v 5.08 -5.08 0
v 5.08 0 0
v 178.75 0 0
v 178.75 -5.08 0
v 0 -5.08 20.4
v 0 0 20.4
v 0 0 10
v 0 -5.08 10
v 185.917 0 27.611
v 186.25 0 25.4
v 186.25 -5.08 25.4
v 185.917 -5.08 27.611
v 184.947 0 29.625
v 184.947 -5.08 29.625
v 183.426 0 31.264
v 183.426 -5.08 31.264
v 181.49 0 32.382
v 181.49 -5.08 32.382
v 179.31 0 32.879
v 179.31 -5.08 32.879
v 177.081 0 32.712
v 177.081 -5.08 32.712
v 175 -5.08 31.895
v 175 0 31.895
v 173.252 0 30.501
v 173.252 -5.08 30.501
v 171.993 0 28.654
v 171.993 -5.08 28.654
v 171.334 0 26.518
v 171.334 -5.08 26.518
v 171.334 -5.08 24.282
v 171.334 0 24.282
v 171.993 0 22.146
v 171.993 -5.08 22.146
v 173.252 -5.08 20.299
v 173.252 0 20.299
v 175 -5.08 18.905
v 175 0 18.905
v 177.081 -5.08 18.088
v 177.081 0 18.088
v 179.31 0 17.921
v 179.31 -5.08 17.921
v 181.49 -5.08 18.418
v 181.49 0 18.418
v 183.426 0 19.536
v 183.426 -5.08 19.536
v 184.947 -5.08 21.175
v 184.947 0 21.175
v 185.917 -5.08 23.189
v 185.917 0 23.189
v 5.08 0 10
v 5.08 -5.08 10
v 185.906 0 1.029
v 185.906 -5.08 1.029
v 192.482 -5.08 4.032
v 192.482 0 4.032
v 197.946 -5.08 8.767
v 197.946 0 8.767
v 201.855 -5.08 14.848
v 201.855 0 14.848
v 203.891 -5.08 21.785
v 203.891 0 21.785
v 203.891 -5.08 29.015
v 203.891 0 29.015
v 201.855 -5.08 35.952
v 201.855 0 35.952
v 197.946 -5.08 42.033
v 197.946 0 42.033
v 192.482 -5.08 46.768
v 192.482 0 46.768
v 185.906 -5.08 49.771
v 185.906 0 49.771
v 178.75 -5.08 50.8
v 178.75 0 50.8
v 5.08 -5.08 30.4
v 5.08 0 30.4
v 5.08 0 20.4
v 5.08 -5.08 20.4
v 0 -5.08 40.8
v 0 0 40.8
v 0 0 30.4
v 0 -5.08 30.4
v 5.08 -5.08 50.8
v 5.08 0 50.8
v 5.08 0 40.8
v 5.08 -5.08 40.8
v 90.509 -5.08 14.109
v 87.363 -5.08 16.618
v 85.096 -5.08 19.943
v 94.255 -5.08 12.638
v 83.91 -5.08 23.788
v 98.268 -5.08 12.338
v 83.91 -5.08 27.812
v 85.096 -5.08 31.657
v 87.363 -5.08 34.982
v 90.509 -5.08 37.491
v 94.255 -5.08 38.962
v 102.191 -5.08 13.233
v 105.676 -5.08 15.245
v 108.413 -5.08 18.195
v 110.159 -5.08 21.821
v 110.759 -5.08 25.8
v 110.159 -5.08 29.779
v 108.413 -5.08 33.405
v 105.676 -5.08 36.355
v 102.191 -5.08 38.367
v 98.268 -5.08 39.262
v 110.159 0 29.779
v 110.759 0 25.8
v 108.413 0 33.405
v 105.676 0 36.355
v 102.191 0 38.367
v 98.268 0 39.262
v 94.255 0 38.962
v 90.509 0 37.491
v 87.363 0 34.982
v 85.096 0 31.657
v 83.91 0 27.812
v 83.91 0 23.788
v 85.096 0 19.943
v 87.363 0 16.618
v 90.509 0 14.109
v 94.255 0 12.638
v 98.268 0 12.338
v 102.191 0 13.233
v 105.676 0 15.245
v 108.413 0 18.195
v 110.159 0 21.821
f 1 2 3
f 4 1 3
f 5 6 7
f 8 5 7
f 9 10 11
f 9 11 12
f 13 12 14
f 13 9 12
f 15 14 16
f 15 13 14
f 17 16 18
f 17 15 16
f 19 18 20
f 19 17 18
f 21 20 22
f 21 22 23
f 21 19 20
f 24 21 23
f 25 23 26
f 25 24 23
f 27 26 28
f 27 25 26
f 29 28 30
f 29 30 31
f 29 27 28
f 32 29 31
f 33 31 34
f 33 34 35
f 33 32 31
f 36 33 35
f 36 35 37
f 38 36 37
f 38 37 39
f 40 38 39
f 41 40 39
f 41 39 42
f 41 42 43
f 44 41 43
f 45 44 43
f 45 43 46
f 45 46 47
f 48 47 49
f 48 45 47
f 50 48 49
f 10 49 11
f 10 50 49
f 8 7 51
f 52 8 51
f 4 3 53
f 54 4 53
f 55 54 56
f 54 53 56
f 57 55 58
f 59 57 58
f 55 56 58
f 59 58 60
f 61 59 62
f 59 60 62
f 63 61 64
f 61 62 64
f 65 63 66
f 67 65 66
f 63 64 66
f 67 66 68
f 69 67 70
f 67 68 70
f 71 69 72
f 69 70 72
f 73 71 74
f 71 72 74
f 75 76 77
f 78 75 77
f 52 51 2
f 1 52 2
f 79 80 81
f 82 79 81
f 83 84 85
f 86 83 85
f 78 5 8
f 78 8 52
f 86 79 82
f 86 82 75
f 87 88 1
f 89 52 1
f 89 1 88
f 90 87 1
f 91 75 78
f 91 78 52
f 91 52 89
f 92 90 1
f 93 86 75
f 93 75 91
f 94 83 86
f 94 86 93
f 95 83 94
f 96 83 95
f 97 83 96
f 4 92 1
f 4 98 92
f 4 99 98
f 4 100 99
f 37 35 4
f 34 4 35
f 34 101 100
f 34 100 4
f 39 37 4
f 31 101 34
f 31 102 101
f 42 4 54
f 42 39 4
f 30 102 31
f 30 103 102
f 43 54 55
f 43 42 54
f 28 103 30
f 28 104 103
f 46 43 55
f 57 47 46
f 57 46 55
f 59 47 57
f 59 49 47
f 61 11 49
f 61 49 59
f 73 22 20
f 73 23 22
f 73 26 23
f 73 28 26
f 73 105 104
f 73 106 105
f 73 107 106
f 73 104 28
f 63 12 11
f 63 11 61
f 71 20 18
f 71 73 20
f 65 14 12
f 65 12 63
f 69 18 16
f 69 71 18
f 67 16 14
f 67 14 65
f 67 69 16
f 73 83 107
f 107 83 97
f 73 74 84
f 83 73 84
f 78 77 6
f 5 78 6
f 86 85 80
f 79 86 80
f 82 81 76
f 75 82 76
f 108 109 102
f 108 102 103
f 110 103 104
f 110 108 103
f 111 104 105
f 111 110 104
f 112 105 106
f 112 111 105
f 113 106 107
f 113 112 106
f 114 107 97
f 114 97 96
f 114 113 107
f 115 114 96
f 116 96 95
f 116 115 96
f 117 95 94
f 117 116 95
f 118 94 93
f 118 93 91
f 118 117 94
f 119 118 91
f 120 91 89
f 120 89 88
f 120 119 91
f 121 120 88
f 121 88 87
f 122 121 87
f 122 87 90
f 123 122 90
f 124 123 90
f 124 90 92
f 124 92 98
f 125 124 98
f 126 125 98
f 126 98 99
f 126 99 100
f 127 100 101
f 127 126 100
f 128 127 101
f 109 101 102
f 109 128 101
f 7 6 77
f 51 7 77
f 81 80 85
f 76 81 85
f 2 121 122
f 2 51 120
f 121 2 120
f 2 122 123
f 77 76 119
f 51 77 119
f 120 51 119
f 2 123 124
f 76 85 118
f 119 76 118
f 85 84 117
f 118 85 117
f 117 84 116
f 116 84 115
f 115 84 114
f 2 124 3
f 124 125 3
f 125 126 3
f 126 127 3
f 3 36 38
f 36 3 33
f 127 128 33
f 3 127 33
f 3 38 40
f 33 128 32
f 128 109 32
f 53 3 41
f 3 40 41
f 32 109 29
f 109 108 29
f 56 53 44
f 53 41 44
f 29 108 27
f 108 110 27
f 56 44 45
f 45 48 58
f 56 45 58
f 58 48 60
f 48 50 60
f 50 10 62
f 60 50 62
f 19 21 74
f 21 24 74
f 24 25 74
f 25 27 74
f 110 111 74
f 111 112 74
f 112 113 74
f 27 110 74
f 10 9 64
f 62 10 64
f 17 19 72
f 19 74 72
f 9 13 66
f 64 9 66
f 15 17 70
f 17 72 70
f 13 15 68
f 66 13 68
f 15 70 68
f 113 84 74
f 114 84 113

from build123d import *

# Parameters (mm, degrees)
F0_R     = 13.5
F0_R_2   = 7.5
F1_DEPTH = 5.08


with BuildPart() as f1:
    # F0 (on Front) → F1 (new body)
    with BuildSketch(Plane.XZ):
        with BuildLine():
            Line((5.08, 0), (178.75, 0))
            ThreePointArc((178.75, 0), (204.15, 25.4), (178.75, 50.8))
            Line((178.75, 50.8), (5.08, 50.8))
            Line((5.08, 50.8), (5.08, 40.8))
            Line((5.08, 40.8), (0, 40.8))
            Line((0, 40.8), (0, 30.4))
            Line((0, 30.4), (5.08, 30.4))
            Line((5.08, 30.4), (5.08, 20.4))
            Line((5.08, 20.4), (0, 20.4))
            Line((0, 20.4), (0, 10))
            Line((0, 10), (5.08, 10))
            Line((5.08, 10), (5.08, 0))
        make_face()
        with Locations((97.259023, 25.8)):
            Circle(F0_R, mode=Mode.SUBTRACT)
        with Locations((178.75, 25.4)):
            Circle(F0_R_2, mode=Mode.SUBTRACT)
    extrude(amount=F1_DEPTH)


solid = f1.part
